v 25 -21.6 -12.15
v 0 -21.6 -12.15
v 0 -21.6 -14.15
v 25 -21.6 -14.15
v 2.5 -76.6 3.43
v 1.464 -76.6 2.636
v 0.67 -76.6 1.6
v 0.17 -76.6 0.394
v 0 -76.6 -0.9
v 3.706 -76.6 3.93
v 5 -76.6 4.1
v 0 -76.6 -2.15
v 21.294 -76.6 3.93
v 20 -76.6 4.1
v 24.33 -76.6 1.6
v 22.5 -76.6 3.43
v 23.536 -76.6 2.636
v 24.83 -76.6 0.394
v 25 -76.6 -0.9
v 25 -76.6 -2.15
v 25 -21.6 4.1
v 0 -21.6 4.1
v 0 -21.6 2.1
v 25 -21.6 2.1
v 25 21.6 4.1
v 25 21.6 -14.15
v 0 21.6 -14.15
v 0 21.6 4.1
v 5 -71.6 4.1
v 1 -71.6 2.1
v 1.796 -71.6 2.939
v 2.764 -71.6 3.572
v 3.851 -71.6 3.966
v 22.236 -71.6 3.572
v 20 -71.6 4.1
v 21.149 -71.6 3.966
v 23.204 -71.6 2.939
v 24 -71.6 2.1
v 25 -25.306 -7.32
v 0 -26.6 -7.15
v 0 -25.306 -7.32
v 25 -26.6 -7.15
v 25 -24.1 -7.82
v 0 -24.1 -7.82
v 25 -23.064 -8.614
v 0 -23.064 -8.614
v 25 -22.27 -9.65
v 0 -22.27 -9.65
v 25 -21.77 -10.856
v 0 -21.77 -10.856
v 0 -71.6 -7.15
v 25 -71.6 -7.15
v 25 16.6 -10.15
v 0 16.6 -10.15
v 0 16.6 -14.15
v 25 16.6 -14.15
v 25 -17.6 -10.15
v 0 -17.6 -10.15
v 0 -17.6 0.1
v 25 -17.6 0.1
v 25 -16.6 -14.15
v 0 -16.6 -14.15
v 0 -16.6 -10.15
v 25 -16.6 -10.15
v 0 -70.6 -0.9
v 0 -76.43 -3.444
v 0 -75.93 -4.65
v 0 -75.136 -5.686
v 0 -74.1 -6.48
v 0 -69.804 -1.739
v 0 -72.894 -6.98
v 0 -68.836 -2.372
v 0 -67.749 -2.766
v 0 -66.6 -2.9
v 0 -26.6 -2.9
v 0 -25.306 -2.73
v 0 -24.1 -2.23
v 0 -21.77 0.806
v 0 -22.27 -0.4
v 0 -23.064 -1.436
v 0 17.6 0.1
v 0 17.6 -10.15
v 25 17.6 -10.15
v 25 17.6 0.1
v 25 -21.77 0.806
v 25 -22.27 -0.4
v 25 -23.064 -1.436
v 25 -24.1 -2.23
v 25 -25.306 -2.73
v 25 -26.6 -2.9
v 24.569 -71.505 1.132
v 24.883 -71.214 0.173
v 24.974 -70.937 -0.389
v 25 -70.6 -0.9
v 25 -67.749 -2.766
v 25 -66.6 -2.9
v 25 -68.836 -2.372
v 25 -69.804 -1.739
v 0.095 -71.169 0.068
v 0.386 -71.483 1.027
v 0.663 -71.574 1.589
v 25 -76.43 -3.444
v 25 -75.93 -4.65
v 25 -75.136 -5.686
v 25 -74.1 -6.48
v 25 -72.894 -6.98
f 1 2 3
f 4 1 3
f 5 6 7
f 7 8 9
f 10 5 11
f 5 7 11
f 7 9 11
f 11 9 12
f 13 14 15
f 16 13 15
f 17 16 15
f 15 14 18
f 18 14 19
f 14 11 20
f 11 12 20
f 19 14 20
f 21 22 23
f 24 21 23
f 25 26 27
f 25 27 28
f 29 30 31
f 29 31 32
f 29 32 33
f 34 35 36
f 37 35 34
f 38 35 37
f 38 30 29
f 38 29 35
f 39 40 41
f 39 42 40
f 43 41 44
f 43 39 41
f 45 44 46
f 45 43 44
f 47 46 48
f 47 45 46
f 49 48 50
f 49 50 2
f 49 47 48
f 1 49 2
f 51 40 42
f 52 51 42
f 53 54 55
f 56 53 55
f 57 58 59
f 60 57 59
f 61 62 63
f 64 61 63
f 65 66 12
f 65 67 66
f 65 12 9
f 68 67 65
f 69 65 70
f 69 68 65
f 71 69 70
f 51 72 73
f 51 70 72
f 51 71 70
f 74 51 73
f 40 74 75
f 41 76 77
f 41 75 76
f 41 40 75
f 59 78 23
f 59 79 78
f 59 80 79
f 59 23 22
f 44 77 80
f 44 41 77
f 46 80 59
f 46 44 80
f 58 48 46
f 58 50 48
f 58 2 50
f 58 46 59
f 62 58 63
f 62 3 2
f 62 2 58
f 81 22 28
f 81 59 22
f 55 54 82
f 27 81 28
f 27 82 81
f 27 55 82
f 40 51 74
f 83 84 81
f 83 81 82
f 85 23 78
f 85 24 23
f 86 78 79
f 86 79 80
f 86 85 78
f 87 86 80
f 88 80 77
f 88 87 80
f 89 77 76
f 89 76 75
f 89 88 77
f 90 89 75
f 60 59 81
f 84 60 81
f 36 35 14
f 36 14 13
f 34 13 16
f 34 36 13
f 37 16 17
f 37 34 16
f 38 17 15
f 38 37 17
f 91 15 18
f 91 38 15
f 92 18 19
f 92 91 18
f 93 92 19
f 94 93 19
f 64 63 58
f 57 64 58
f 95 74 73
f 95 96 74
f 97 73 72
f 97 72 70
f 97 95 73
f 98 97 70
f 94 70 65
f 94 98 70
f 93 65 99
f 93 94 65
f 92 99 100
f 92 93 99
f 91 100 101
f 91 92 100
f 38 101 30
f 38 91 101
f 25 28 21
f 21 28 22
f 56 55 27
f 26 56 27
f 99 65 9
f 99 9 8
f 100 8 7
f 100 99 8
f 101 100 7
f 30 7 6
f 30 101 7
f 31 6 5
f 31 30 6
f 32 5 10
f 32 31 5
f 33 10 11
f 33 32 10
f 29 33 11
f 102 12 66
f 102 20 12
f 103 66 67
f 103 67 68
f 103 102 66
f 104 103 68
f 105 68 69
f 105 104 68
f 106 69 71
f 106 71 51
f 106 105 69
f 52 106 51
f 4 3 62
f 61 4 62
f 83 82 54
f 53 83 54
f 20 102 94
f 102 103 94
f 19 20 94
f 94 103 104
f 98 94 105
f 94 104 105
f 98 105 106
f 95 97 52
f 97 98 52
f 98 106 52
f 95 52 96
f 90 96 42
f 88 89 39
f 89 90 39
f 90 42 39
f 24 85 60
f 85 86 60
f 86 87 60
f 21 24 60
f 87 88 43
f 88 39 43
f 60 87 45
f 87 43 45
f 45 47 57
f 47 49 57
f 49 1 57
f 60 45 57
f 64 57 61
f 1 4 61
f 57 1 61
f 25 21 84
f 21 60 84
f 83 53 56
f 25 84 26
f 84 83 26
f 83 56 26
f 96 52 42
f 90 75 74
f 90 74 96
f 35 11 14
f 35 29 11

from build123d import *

# Parameters (mm, degrees)
F1_DEPTH = 25
F3_W     = 25
F3_H     = 4.25
F4_DEPTH = 55
F5_W     = 25
F5_H     = 5
F6_DEPTH = 7
F7_R     = 5
F8_R     = 5


# Not quite as in the source:
# - a feature of the source that left no trace in its solid (it failed there, or was rolled back) is left out


with BuildPart() as f1:
    # F0 (on Right) → F1 (new body)
    with BuildSketch(Plane.YZ):
        Polygon((17.6, 0.1), (17.6, -10.15), (16.6, -10.15), (16.6, -14.15), (21.6, -14.15), (21.6, 4.1), (0, 4.1), (-21.6, 4.1), (-21.6, -14.15), (-16.6, -14.15), (-16.6, -10.15), (-17.6, -10.15), (-17.6, 0.1), (0, 0.1), align=None)
    extrude(amount=F1_DEPTH)

    # F3 (on face) → F4 (join)
    with BuildSketch(Plane.XZ.offset(21.6)):
        with Locations((12.5, -5.025)):
            Rectangle(F3_W, F3_H)
    extrude(amount=F4_DEPTH)

    # F5 (on face) → F6 (join, through all)
    with BuildSketch(Plane.XY.offset(-2.9)):
        with Locations((12.5, -74.1)):
            Rectangle(F5_W, F5_H)
    extrude(amount=F6_DEPTH)

    # F7
    f7_edges = [f1.edges().sort_by_distance(p)[0] for p in [
        (12.5, -21.6, -2.9),
        (12.5, -21.6, -7.15),
        (12.5, -71.6, -2.9),
        (12.5, -76.6, -7.15),
    ]]
    fillet(f7_edges, radius=F7_R)

    # F8
    f8_edges = [f1.edges().sort_by_distance(p)[0] for p in [
        (0, -74.1, 4.1),
        (25, -74.1, 4.1),
    ]]
    fillet(f8_edges, radius=F8_R)


solid = f1.part
